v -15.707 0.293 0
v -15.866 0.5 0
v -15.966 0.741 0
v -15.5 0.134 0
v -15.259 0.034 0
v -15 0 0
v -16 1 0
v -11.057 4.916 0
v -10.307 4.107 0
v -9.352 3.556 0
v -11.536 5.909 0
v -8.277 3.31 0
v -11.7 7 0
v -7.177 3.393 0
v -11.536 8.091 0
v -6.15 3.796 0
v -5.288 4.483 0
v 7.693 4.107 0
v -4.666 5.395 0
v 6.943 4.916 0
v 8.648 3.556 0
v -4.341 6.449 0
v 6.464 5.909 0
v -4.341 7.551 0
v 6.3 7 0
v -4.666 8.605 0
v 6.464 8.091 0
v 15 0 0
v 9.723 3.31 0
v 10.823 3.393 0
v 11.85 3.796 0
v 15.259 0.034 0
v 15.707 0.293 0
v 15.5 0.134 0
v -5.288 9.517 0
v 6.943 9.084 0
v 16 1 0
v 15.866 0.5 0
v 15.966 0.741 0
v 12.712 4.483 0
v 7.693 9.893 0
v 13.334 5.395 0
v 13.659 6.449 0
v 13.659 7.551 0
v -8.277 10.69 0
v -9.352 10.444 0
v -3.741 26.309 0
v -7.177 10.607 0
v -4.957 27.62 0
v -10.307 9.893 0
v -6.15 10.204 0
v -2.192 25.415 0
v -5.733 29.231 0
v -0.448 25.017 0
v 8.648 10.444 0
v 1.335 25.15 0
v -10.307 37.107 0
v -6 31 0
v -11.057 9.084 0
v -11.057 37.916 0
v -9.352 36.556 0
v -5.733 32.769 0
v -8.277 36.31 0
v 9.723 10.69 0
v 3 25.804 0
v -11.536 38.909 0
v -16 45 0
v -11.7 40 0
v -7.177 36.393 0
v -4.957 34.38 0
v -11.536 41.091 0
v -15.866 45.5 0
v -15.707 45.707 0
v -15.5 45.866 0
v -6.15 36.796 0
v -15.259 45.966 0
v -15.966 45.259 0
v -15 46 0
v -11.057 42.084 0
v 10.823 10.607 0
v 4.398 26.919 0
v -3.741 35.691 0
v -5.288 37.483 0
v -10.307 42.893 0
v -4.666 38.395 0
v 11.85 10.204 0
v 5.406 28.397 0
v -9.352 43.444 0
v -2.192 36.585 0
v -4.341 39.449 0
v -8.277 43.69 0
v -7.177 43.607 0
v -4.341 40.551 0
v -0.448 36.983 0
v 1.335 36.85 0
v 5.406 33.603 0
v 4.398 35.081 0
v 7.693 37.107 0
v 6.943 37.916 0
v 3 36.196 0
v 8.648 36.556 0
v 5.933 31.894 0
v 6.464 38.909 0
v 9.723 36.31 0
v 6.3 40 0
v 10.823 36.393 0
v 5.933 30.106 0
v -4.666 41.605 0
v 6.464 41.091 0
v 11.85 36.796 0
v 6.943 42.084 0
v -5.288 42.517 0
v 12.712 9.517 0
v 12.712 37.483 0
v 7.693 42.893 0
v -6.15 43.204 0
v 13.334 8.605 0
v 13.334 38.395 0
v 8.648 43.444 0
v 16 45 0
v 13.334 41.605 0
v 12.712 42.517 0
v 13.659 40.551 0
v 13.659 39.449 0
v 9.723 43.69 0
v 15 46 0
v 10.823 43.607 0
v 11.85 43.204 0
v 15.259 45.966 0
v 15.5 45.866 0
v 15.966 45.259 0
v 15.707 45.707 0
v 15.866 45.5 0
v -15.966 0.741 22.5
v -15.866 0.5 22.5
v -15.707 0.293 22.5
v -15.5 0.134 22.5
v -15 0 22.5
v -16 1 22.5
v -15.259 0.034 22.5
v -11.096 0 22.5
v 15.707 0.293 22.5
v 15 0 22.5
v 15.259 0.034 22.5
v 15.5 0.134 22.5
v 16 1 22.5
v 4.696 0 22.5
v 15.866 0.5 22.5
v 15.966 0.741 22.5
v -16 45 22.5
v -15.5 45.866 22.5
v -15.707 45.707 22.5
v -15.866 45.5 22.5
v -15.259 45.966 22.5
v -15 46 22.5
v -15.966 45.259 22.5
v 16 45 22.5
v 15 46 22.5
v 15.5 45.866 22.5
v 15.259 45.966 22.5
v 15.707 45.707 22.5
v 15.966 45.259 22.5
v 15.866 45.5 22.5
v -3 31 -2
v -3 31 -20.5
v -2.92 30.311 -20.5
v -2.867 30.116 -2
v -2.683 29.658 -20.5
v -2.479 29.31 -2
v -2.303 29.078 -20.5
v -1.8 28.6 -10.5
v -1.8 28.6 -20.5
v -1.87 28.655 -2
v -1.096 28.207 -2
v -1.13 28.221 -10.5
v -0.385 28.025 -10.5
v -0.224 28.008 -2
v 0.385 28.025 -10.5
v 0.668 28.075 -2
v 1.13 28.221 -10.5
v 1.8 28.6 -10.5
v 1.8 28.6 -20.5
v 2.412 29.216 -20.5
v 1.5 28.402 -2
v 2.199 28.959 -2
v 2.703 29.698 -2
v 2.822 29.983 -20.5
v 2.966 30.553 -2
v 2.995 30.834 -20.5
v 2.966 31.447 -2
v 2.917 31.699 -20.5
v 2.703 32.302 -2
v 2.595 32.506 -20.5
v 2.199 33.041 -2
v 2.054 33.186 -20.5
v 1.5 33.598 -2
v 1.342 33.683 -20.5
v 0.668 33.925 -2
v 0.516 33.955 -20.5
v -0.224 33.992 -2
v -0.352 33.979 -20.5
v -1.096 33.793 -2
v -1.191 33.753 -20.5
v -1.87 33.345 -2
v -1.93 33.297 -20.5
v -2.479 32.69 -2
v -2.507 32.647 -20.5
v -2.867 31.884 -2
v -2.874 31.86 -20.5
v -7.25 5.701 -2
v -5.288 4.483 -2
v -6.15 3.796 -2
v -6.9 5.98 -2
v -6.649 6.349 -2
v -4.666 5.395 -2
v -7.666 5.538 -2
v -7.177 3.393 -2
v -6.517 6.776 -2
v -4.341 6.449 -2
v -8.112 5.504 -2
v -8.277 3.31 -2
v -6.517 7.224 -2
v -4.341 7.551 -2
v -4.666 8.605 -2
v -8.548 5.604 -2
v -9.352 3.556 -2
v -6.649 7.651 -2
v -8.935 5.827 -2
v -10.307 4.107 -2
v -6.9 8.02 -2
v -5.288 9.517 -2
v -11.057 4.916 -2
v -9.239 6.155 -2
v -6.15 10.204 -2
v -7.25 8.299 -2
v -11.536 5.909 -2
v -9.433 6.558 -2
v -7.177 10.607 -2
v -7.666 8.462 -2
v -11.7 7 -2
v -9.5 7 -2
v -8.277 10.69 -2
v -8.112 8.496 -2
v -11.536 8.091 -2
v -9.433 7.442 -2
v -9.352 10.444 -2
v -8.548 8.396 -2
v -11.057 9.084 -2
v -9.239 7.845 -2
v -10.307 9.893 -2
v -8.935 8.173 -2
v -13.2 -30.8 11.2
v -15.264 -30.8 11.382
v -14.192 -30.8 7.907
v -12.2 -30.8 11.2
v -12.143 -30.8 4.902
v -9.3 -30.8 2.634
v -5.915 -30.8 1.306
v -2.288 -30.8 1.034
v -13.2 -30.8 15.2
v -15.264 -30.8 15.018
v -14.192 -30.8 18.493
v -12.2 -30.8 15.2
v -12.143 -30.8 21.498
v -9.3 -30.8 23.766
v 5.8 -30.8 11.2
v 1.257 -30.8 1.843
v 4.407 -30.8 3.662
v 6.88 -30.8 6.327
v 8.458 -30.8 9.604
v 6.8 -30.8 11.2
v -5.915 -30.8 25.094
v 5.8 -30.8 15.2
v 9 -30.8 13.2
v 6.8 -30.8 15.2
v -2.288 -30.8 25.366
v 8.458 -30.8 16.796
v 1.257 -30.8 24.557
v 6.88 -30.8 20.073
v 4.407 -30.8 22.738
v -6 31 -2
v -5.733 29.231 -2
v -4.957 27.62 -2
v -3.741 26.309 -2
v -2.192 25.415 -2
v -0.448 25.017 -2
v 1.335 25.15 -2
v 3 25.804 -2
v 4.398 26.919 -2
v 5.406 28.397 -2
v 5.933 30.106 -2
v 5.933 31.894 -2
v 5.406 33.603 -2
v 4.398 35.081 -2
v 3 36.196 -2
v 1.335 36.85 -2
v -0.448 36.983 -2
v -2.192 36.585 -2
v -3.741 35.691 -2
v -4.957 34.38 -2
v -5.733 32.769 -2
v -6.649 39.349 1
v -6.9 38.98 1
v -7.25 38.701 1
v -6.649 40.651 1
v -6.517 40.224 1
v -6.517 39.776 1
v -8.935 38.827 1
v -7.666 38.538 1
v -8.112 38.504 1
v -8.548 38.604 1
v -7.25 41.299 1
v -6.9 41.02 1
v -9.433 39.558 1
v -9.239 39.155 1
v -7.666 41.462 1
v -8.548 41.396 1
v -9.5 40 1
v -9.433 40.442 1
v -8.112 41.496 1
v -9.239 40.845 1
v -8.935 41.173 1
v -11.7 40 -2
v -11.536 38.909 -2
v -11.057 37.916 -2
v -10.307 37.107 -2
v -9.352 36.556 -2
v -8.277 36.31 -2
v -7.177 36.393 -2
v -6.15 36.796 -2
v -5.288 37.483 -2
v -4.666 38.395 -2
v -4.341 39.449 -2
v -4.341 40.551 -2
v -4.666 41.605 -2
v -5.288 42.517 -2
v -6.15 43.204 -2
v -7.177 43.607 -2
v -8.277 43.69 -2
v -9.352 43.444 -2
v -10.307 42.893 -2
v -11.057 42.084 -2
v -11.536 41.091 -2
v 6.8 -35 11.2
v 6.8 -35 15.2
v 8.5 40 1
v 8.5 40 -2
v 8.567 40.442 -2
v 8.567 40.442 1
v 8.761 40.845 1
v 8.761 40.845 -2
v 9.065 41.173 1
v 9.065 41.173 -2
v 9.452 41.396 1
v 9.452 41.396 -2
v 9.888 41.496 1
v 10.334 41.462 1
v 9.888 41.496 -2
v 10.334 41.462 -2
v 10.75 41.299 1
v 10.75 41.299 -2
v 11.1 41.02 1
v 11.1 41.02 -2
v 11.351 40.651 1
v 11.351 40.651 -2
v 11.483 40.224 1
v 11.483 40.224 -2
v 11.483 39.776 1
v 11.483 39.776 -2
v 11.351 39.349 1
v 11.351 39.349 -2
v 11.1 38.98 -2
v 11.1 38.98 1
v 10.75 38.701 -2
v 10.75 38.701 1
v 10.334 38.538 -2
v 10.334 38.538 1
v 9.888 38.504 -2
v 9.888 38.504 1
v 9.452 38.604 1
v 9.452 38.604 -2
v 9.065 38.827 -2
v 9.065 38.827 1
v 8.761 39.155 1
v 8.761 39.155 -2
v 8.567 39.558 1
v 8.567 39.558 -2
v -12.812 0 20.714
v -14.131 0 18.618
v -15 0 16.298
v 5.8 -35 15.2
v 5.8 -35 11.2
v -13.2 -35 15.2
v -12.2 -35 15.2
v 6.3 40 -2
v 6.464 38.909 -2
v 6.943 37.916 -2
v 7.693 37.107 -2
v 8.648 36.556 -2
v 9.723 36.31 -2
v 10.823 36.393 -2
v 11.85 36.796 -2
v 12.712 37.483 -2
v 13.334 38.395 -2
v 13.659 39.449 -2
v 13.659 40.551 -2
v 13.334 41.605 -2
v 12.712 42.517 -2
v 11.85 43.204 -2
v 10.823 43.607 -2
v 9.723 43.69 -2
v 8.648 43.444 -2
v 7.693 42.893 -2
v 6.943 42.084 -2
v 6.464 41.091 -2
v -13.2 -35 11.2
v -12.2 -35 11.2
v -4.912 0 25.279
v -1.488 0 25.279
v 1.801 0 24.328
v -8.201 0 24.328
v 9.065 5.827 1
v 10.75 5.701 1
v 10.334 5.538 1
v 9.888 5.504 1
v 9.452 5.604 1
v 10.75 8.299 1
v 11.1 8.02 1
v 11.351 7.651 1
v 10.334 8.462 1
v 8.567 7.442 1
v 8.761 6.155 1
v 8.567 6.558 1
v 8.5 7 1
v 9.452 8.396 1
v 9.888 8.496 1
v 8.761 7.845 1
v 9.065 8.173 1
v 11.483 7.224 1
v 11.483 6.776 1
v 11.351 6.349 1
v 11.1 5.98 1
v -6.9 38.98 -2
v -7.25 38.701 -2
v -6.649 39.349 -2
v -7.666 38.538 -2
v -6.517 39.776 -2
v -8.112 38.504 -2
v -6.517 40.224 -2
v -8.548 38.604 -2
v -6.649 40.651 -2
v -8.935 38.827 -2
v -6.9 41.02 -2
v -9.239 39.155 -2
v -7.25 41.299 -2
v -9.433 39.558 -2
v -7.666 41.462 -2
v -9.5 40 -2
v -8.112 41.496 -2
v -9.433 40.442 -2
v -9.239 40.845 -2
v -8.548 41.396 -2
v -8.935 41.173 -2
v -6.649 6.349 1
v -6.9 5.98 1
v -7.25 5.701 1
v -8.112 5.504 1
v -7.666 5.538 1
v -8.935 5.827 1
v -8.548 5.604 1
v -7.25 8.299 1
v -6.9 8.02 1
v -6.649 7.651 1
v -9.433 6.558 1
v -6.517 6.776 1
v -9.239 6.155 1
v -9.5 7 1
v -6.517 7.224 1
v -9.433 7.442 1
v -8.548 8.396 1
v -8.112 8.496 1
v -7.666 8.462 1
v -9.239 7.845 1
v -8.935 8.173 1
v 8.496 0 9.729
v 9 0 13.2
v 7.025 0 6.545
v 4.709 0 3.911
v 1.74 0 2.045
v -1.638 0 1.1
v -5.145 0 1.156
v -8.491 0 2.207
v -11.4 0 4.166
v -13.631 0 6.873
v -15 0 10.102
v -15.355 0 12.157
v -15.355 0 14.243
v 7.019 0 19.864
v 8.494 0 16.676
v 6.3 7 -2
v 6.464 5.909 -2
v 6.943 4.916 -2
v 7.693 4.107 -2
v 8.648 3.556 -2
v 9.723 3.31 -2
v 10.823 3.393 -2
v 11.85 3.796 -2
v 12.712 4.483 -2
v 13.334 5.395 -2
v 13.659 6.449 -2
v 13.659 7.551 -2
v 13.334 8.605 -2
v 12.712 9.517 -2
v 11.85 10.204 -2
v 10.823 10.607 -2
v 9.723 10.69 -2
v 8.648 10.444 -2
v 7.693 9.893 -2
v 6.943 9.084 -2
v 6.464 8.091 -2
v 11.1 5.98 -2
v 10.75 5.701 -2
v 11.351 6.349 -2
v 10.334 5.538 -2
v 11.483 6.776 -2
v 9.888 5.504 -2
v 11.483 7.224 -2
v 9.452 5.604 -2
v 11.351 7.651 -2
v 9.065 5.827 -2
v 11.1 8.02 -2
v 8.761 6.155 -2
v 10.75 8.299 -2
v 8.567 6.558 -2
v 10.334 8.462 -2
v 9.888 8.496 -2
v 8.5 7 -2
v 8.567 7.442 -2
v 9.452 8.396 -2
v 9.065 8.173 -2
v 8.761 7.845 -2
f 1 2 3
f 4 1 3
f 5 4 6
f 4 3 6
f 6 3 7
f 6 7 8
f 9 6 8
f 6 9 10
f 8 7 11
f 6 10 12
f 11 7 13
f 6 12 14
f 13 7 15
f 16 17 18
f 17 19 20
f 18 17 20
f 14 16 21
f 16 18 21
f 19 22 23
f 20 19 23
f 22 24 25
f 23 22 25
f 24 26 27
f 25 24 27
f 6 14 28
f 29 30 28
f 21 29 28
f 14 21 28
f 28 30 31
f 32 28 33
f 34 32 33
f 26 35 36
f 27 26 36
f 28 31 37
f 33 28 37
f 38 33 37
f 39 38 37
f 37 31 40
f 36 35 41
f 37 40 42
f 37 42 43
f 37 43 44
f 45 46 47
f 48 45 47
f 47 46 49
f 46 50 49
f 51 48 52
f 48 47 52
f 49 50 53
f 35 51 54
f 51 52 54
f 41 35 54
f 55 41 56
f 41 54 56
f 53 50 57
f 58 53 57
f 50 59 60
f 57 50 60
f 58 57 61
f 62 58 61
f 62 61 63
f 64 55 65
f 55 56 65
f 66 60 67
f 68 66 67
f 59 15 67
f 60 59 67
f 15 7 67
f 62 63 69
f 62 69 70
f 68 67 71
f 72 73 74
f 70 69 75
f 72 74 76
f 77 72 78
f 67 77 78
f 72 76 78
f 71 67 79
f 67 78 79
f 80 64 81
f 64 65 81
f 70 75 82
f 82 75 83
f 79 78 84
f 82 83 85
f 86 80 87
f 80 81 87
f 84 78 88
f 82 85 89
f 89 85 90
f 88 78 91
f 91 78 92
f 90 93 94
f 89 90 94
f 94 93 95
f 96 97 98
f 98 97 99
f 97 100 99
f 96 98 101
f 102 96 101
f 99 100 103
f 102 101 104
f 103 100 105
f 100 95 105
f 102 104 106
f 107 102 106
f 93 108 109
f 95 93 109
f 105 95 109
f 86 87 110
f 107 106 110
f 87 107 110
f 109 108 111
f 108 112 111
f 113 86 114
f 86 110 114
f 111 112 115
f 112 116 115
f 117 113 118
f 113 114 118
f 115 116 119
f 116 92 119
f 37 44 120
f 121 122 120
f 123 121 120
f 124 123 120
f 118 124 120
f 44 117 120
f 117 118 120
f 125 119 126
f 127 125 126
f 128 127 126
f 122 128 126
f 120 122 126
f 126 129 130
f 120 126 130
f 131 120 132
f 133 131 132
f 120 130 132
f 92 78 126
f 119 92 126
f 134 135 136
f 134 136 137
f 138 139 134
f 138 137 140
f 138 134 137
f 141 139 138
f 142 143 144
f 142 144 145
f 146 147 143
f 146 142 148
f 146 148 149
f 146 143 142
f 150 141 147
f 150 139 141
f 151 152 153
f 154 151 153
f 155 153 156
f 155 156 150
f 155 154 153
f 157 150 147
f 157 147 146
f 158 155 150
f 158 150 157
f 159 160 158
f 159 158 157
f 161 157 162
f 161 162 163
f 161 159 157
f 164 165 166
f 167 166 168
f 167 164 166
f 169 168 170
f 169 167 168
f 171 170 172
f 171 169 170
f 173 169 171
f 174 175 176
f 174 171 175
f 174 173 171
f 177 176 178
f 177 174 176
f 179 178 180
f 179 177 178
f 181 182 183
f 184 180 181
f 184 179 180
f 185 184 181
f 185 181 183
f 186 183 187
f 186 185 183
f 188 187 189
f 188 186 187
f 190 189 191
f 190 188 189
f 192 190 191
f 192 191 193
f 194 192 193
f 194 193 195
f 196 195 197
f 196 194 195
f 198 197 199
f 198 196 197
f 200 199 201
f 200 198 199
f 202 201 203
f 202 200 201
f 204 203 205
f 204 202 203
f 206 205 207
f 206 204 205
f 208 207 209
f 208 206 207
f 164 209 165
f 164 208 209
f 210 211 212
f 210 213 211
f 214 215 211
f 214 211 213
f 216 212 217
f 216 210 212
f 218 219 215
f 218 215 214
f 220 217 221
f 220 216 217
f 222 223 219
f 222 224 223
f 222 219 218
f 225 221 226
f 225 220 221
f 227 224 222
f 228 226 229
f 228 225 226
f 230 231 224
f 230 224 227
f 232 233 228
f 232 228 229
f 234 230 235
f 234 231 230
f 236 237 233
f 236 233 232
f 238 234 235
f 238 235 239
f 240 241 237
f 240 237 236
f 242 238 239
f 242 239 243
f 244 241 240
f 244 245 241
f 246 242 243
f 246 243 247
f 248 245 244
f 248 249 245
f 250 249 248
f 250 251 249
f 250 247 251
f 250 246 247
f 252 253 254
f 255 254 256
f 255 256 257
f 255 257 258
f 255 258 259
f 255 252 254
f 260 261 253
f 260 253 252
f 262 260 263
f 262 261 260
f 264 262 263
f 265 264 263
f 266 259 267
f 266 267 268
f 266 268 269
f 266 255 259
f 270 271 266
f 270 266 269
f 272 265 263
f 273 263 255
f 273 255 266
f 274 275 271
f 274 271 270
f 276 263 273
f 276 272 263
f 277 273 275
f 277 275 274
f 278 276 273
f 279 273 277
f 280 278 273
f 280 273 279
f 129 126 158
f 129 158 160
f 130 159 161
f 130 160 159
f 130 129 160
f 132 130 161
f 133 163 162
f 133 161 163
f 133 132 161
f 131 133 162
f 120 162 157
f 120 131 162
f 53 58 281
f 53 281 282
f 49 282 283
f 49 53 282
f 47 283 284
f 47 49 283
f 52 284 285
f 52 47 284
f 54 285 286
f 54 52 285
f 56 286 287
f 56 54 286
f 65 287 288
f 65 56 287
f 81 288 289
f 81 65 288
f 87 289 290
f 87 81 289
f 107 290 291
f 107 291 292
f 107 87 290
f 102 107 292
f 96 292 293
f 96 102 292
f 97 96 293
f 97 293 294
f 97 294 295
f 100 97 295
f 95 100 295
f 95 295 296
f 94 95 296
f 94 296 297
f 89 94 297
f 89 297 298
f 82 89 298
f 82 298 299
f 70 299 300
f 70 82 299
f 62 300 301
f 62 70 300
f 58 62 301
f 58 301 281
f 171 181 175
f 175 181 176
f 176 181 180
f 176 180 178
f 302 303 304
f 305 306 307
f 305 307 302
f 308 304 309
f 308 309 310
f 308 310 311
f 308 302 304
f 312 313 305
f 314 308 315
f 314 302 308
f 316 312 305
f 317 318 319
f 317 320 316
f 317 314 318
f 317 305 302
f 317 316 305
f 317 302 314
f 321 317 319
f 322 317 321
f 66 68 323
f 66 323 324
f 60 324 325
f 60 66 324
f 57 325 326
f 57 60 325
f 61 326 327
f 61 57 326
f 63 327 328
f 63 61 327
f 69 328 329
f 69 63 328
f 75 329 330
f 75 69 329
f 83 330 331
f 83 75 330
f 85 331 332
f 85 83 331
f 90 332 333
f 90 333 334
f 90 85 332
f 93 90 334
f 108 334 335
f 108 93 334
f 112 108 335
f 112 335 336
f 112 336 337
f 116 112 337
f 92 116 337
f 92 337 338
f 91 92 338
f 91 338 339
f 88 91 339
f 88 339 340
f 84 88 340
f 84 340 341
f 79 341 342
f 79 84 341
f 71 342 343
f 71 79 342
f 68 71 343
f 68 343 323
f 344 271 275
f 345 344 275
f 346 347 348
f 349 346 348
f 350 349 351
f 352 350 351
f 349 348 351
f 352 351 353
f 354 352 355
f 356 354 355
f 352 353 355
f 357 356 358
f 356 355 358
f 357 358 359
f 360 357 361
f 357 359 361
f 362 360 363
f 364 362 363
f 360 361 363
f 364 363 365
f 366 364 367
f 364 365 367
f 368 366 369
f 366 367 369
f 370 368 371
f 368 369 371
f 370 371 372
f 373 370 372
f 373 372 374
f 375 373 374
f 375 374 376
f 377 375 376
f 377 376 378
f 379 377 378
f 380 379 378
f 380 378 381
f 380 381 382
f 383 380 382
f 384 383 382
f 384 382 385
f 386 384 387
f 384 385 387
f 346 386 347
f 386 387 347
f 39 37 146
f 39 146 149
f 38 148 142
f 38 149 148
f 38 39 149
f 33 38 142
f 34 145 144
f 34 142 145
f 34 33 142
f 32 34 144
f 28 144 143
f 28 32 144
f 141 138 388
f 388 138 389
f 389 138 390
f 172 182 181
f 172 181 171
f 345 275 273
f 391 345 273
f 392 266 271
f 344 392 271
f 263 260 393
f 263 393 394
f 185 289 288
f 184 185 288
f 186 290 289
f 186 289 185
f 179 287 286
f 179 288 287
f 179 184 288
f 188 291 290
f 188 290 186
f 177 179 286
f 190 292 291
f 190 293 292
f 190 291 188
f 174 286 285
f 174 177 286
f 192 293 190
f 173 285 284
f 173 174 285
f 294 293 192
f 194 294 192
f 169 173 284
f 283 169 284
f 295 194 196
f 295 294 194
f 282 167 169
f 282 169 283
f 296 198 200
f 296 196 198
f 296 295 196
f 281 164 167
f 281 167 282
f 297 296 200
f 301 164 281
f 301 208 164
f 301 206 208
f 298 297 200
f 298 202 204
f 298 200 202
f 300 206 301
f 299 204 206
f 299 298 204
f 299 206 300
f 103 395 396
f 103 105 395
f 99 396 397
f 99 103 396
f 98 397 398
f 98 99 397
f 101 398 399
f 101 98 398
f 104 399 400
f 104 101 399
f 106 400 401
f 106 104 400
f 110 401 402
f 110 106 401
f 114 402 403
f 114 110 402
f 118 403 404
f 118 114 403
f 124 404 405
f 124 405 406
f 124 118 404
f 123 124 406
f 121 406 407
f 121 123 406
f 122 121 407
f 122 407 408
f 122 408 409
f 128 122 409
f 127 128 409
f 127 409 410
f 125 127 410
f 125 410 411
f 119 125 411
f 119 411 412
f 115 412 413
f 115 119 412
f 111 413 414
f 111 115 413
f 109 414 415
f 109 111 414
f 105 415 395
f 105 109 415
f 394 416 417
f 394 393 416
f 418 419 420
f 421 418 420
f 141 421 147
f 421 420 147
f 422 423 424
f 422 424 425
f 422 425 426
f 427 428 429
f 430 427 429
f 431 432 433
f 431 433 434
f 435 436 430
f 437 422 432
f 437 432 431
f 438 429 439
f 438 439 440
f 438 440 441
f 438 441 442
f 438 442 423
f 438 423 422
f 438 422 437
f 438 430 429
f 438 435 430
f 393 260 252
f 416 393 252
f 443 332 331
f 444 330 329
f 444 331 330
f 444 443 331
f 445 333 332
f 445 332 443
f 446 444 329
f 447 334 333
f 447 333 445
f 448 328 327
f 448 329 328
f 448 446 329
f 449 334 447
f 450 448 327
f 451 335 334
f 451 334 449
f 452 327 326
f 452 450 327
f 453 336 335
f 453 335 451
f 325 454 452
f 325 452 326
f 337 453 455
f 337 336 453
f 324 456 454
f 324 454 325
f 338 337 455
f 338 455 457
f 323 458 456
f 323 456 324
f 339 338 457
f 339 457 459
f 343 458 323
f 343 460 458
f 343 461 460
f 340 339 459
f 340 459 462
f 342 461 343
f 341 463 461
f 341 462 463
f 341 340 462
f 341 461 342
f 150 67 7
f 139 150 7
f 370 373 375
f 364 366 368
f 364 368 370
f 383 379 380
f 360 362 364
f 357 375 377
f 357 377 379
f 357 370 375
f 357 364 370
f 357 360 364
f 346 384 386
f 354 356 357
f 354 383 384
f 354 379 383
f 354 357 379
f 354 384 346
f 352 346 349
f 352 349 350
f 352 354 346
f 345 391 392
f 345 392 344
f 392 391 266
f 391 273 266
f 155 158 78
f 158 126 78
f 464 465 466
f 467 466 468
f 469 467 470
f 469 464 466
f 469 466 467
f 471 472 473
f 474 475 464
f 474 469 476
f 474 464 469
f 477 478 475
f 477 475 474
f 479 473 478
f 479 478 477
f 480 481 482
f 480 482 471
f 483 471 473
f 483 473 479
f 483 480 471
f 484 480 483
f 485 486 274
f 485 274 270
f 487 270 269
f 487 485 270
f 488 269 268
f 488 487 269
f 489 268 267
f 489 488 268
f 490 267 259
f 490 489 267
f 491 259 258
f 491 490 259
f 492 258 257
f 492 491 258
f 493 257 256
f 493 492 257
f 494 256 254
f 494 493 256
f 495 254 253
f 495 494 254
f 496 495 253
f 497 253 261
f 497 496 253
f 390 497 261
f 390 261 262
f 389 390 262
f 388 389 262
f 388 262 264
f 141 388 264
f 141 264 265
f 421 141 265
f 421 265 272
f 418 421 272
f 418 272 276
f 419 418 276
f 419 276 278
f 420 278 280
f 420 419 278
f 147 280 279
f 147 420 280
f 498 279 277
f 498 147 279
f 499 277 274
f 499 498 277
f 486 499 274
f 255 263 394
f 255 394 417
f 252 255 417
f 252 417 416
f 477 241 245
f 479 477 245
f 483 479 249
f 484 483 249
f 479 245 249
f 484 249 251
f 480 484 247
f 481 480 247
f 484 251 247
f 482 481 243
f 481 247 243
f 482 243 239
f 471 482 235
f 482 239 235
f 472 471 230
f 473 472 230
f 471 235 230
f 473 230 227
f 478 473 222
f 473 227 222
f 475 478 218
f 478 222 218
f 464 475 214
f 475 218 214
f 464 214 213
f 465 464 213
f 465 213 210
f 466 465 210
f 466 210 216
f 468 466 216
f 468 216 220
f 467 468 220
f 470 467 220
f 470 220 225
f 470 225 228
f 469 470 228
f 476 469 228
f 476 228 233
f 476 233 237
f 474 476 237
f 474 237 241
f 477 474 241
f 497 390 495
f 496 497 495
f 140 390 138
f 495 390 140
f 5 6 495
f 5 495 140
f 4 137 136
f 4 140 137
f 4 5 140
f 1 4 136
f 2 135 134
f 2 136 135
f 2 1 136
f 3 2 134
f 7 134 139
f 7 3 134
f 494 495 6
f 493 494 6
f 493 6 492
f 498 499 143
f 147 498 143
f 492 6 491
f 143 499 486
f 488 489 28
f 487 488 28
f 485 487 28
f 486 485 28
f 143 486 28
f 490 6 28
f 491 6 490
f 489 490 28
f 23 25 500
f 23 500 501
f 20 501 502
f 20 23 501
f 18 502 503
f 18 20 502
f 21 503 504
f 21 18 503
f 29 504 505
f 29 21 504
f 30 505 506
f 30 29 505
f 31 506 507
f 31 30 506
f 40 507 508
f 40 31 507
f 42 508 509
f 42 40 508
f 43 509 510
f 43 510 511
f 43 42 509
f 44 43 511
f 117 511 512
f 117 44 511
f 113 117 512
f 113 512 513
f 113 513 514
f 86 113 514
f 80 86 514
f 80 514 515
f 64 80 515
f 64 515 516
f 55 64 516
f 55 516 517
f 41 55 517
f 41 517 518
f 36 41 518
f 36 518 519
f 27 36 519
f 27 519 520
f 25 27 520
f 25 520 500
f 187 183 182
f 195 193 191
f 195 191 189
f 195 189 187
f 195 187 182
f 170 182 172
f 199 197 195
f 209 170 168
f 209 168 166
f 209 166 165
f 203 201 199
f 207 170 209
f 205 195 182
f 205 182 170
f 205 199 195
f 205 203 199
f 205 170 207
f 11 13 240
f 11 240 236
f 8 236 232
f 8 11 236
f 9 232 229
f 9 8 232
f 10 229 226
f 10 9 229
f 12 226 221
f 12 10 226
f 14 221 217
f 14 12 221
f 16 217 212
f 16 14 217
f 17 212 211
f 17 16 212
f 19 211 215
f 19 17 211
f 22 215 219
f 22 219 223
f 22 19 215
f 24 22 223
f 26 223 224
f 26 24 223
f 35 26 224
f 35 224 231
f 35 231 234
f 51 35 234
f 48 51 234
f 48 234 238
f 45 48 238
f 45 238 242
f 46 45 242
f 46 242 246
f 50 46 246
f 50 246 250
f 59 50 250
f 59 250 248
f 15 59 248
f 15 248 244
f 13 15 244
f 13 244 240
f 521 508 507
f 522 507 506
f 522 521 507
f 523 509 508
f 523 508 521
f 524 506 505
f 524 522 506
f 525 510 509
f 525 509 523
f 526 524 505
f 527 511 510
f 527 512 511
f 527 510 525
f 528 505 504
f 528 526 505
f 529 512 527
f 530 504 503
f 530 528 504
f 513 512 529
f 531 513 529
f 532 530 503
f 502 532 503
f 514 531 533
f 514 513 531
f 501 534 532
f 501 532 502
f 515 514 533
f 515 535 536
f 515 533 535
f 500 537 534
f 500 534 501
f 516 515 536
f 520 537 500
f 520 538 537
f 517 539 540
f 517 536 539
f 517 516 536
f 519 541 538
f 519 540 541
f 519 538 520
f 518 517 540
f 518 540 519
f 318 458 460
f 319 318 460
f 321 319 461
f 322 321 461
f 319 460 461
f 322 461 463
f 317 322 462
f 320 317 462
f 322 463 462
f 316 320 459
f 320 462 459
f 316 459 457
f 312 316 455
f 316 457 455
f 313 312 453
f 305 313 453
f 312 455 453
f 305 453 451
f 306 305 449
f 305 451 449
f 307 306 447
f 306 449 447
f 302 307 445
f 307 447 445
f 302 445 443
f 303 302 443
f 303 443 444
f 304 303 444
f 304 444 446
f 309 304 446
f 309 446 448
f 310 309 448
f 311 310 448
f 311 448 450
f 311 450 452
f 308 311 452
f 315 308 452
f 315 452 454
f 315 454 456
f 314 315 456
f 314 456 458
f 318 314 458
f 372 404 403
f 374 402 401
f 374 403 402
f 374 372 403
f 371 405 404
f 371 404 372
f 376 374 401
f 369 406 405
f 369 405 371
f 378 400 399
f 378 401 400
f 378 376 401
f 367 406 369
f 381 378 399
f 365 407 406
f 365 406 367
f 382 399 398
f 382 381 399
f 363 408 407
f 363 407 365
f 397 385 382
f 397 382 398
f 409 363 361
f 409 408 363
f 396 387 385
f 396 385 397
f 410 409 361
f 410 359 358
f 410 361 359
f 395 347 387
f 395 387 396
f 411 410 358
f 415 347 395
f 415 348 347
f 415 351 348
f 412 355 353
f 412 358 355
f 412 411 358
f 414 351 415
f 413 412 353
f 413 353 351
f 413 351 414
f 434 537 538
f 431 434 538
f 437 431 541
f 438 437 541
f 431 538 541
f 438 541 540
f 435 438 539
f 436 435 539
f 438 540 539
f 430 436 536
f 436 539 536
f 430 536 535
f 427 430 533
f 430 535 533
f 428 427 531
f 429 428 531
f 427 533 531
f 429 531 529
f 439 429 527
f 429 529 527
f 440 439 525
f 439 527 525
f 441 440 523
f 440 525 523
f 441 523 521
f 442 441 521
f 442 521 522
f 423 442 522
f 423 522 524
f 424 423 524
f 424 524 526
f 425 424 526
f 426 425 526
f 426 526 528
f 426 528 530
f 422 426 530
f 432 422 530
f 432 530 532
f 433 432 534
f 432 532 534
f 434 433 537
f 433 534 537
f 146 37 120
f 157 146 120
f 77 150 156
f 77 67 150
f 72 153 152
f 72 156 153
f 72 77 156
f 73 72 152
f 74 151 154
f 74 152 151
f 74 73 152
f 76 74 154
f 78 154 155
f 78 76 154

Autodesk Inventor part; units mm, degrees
ref_plane "YZ Plane" through (0, 0, 0) normal (1, 0, 0) x (0, 1, 0)
ref_plane "XZ Plane" through (0, 0, 0) normal (0, 1, 0) x (-1, 0, 0)
ref_plane "XY Plane" through (0, 0, 0) normal (0, 0, 1) x (1, 0, 0)
sketch "Sketch1" plane through (0, 0, 0) normal (0, 0, 1) x (1, 0, 0)
  line L0 (0, 0) -> (15, 0)
  line L1 (16, 1) -> (16, 45)
  line L2 (15, 46) -> (-15, 46)
  line L3 (-16, 45) -> (-16, 1)
  line L4 (-15, 0) -> (16, 0)
  arc A0 (-15, 46) -> (-16, 45) centre (-15, 45) ccw
  arc A1 (16, 45) -> (15, 46) centre (15, 45) ccw
  arc A2 (15, 0) -> (16, 1) centre (15, 1) ccw
  arc A3 (-16, 1) -> (-15, 0) centre (-15, 1) ccw
  point P0 (16, 46)
  point P1 (-16, 46)
  dimension "d0" = 16
  dimension "d1" = 46
  dimension "d2" = 32
  dimension "d3" = 1
extrude "Extrusion1" add sketch "Sketch1" along normal blind 22.5
sketch "Sketch2" plane through (0, 0, 0) normal (0, 0, -1) x (-1, 0, 0)
  line L0 (0, 0) -> (-10, 0)
  line L1 (15, 0) -> (-15, 0) projected
  line L2 (-10, 0) -> (-10, 7)
  line L3 (-10, 7) -> (-10, 40)
  circle A0 centre (-10, 7) radius 3.7
  circle A1 centre (-10, 40) radius 3.7
  line L4 (-10, 40) -> (8, 40)
  line L5 (-10, 7) -> (8, 7)
  circle A2 centre (8, 7) radius 3.7
  circle A3 centre (8, 40) radius 3.7
  line L6 (-15, 46) -> (15, 46) projected
  line L7 (0, 46) -> (0, 31)
  circle A4 centre (0, 31) radius 6
  dimension "d6" = 10
  dimension "d7" = 7
  dimension "d8" = 33
  dimension "d9" = 7.4
  dimension "d10" = 7.4
  dimension "d11" = 18
  dimension "d12" = 18
  dimension "d13" = 7.4
  dimension "d14" = 7.4
  dimension "d23" = 15
  dimension "d24" = 12
extrude "Extrusion2" add sketch "Sketch2" along normal blind 2
sketch "Sketch3" plane through (10, 7, -2) normal (0, 0, -1) x (-1, 0, 0)
  circle A0 centre (0, 0) radius 3.7 projected
  circle A1 centre (0, 0) radius 1.5
  circle A2 centre (0, 33) radius 3.7 projected
  circle A3 centre (0, 33) radius 1.5
  circle A4 centre (18, 33) radius 3.7 projected
  circle A5 centre (18, 33) radius 1.5
  circle A6 centre (18, 0) radius 3.7 projected
  circle A7 centre (18, 0) radius 1.5
  point P0 (10, -7)
  dimension "d17" = 3
  dimension "d18" = 3
  dimension "d19" = 3
  dimension "d20" = 3
extrude "Extrusion3" cut sketch "Sketch3" against normal blind 3 contours A1 | A3 | A5 | A7
sketch "Sketch4" plane through (0, 31, -2) normal (0, 0, -1) x (-1, 0, 0)
  circle A0 centre (0, 0) radius 6 projected
  circle A1 centre (0, 0) radius 3
  point P0 (0, -31)
  dimension "d25" = 6
extrude "Extrusion4" add sketch "Sketch4" along normal blind 18.5 contours A1
sketch "Sketch5" plane through (0, 31, -20.5) normal (0, 0, -1) x (-1, 0, 0)
  circle A0 centre (0, 0) radius 3 projected
  line L0 (0, 3) -> (0, -2.4)
  line L1 (0, -2.4) -> (-1.8, -2.4)
  line L2 (0, -2.4) -> (1.8, -2.4)
  point P0 (0, -31)
  dimension "d28" = 5.4
extrude "Extrusion5" cut sketch "Sketch5" against normal blind 10 contours A0 L1 L2
sketch "Sketch6" plane through (-15, 0, 0) normal (0, -1, 0) x (1, 0, 0)
  circle A0 centre (11.8, 13.2) radius 12.2
  line L0 (-1, 0) -> (-1, 22.5) projected
  line L1 (0, 0) -> (30, 0) projected
  point P0 (15, 0)
  dimension "d31" = 24.4
  dimension "d40" = 13.2
  dimension "d41" = 12.8
extrude "Extrusion6" add sketch "Sketch6" along normal blind 30.8
sketch "Sketch7" plane through (-3.2, -30.8, 13.2) normal (0, -1, 0) x (1, 0, 0)
  line L0 (0, 0) -> (10, 0)
  line L1 (10, 0) -> (10, -2)
  line L2 (10, -2) -> (10, 2)
  line L3 (10, 2) -> (9, 2)
  line L4 (9, 2) -> (9, -2)
  line L5 (9, -2) -> (10, -2)
  line L6 (0, 0) -> (0, -2)
  line L7 (0, 0) -> (-10, 0)
  line L8 (-10, 0) -> (-10, -2)
  line L9 (-10, -2) -> (-10, 2)
  line L10 (-10, 2) -> (-9, 2)
  line L11 (-9, 2) -> (-9, -2)
  line L12 (-9, -2) -> (-10, -2)
  point P0 (3.2, -13.2)
  dimension "d34" = 10
  dimension "d35" = 2
  dimension "d36" = 4
  dimension "d37" = 1
extrude "Extrusion7" add sketch "Sketch7" along normal blind 4.2
equation "\"d0\" = 0.5 * d2"
properties part number "motor_dc_12v_90d"
